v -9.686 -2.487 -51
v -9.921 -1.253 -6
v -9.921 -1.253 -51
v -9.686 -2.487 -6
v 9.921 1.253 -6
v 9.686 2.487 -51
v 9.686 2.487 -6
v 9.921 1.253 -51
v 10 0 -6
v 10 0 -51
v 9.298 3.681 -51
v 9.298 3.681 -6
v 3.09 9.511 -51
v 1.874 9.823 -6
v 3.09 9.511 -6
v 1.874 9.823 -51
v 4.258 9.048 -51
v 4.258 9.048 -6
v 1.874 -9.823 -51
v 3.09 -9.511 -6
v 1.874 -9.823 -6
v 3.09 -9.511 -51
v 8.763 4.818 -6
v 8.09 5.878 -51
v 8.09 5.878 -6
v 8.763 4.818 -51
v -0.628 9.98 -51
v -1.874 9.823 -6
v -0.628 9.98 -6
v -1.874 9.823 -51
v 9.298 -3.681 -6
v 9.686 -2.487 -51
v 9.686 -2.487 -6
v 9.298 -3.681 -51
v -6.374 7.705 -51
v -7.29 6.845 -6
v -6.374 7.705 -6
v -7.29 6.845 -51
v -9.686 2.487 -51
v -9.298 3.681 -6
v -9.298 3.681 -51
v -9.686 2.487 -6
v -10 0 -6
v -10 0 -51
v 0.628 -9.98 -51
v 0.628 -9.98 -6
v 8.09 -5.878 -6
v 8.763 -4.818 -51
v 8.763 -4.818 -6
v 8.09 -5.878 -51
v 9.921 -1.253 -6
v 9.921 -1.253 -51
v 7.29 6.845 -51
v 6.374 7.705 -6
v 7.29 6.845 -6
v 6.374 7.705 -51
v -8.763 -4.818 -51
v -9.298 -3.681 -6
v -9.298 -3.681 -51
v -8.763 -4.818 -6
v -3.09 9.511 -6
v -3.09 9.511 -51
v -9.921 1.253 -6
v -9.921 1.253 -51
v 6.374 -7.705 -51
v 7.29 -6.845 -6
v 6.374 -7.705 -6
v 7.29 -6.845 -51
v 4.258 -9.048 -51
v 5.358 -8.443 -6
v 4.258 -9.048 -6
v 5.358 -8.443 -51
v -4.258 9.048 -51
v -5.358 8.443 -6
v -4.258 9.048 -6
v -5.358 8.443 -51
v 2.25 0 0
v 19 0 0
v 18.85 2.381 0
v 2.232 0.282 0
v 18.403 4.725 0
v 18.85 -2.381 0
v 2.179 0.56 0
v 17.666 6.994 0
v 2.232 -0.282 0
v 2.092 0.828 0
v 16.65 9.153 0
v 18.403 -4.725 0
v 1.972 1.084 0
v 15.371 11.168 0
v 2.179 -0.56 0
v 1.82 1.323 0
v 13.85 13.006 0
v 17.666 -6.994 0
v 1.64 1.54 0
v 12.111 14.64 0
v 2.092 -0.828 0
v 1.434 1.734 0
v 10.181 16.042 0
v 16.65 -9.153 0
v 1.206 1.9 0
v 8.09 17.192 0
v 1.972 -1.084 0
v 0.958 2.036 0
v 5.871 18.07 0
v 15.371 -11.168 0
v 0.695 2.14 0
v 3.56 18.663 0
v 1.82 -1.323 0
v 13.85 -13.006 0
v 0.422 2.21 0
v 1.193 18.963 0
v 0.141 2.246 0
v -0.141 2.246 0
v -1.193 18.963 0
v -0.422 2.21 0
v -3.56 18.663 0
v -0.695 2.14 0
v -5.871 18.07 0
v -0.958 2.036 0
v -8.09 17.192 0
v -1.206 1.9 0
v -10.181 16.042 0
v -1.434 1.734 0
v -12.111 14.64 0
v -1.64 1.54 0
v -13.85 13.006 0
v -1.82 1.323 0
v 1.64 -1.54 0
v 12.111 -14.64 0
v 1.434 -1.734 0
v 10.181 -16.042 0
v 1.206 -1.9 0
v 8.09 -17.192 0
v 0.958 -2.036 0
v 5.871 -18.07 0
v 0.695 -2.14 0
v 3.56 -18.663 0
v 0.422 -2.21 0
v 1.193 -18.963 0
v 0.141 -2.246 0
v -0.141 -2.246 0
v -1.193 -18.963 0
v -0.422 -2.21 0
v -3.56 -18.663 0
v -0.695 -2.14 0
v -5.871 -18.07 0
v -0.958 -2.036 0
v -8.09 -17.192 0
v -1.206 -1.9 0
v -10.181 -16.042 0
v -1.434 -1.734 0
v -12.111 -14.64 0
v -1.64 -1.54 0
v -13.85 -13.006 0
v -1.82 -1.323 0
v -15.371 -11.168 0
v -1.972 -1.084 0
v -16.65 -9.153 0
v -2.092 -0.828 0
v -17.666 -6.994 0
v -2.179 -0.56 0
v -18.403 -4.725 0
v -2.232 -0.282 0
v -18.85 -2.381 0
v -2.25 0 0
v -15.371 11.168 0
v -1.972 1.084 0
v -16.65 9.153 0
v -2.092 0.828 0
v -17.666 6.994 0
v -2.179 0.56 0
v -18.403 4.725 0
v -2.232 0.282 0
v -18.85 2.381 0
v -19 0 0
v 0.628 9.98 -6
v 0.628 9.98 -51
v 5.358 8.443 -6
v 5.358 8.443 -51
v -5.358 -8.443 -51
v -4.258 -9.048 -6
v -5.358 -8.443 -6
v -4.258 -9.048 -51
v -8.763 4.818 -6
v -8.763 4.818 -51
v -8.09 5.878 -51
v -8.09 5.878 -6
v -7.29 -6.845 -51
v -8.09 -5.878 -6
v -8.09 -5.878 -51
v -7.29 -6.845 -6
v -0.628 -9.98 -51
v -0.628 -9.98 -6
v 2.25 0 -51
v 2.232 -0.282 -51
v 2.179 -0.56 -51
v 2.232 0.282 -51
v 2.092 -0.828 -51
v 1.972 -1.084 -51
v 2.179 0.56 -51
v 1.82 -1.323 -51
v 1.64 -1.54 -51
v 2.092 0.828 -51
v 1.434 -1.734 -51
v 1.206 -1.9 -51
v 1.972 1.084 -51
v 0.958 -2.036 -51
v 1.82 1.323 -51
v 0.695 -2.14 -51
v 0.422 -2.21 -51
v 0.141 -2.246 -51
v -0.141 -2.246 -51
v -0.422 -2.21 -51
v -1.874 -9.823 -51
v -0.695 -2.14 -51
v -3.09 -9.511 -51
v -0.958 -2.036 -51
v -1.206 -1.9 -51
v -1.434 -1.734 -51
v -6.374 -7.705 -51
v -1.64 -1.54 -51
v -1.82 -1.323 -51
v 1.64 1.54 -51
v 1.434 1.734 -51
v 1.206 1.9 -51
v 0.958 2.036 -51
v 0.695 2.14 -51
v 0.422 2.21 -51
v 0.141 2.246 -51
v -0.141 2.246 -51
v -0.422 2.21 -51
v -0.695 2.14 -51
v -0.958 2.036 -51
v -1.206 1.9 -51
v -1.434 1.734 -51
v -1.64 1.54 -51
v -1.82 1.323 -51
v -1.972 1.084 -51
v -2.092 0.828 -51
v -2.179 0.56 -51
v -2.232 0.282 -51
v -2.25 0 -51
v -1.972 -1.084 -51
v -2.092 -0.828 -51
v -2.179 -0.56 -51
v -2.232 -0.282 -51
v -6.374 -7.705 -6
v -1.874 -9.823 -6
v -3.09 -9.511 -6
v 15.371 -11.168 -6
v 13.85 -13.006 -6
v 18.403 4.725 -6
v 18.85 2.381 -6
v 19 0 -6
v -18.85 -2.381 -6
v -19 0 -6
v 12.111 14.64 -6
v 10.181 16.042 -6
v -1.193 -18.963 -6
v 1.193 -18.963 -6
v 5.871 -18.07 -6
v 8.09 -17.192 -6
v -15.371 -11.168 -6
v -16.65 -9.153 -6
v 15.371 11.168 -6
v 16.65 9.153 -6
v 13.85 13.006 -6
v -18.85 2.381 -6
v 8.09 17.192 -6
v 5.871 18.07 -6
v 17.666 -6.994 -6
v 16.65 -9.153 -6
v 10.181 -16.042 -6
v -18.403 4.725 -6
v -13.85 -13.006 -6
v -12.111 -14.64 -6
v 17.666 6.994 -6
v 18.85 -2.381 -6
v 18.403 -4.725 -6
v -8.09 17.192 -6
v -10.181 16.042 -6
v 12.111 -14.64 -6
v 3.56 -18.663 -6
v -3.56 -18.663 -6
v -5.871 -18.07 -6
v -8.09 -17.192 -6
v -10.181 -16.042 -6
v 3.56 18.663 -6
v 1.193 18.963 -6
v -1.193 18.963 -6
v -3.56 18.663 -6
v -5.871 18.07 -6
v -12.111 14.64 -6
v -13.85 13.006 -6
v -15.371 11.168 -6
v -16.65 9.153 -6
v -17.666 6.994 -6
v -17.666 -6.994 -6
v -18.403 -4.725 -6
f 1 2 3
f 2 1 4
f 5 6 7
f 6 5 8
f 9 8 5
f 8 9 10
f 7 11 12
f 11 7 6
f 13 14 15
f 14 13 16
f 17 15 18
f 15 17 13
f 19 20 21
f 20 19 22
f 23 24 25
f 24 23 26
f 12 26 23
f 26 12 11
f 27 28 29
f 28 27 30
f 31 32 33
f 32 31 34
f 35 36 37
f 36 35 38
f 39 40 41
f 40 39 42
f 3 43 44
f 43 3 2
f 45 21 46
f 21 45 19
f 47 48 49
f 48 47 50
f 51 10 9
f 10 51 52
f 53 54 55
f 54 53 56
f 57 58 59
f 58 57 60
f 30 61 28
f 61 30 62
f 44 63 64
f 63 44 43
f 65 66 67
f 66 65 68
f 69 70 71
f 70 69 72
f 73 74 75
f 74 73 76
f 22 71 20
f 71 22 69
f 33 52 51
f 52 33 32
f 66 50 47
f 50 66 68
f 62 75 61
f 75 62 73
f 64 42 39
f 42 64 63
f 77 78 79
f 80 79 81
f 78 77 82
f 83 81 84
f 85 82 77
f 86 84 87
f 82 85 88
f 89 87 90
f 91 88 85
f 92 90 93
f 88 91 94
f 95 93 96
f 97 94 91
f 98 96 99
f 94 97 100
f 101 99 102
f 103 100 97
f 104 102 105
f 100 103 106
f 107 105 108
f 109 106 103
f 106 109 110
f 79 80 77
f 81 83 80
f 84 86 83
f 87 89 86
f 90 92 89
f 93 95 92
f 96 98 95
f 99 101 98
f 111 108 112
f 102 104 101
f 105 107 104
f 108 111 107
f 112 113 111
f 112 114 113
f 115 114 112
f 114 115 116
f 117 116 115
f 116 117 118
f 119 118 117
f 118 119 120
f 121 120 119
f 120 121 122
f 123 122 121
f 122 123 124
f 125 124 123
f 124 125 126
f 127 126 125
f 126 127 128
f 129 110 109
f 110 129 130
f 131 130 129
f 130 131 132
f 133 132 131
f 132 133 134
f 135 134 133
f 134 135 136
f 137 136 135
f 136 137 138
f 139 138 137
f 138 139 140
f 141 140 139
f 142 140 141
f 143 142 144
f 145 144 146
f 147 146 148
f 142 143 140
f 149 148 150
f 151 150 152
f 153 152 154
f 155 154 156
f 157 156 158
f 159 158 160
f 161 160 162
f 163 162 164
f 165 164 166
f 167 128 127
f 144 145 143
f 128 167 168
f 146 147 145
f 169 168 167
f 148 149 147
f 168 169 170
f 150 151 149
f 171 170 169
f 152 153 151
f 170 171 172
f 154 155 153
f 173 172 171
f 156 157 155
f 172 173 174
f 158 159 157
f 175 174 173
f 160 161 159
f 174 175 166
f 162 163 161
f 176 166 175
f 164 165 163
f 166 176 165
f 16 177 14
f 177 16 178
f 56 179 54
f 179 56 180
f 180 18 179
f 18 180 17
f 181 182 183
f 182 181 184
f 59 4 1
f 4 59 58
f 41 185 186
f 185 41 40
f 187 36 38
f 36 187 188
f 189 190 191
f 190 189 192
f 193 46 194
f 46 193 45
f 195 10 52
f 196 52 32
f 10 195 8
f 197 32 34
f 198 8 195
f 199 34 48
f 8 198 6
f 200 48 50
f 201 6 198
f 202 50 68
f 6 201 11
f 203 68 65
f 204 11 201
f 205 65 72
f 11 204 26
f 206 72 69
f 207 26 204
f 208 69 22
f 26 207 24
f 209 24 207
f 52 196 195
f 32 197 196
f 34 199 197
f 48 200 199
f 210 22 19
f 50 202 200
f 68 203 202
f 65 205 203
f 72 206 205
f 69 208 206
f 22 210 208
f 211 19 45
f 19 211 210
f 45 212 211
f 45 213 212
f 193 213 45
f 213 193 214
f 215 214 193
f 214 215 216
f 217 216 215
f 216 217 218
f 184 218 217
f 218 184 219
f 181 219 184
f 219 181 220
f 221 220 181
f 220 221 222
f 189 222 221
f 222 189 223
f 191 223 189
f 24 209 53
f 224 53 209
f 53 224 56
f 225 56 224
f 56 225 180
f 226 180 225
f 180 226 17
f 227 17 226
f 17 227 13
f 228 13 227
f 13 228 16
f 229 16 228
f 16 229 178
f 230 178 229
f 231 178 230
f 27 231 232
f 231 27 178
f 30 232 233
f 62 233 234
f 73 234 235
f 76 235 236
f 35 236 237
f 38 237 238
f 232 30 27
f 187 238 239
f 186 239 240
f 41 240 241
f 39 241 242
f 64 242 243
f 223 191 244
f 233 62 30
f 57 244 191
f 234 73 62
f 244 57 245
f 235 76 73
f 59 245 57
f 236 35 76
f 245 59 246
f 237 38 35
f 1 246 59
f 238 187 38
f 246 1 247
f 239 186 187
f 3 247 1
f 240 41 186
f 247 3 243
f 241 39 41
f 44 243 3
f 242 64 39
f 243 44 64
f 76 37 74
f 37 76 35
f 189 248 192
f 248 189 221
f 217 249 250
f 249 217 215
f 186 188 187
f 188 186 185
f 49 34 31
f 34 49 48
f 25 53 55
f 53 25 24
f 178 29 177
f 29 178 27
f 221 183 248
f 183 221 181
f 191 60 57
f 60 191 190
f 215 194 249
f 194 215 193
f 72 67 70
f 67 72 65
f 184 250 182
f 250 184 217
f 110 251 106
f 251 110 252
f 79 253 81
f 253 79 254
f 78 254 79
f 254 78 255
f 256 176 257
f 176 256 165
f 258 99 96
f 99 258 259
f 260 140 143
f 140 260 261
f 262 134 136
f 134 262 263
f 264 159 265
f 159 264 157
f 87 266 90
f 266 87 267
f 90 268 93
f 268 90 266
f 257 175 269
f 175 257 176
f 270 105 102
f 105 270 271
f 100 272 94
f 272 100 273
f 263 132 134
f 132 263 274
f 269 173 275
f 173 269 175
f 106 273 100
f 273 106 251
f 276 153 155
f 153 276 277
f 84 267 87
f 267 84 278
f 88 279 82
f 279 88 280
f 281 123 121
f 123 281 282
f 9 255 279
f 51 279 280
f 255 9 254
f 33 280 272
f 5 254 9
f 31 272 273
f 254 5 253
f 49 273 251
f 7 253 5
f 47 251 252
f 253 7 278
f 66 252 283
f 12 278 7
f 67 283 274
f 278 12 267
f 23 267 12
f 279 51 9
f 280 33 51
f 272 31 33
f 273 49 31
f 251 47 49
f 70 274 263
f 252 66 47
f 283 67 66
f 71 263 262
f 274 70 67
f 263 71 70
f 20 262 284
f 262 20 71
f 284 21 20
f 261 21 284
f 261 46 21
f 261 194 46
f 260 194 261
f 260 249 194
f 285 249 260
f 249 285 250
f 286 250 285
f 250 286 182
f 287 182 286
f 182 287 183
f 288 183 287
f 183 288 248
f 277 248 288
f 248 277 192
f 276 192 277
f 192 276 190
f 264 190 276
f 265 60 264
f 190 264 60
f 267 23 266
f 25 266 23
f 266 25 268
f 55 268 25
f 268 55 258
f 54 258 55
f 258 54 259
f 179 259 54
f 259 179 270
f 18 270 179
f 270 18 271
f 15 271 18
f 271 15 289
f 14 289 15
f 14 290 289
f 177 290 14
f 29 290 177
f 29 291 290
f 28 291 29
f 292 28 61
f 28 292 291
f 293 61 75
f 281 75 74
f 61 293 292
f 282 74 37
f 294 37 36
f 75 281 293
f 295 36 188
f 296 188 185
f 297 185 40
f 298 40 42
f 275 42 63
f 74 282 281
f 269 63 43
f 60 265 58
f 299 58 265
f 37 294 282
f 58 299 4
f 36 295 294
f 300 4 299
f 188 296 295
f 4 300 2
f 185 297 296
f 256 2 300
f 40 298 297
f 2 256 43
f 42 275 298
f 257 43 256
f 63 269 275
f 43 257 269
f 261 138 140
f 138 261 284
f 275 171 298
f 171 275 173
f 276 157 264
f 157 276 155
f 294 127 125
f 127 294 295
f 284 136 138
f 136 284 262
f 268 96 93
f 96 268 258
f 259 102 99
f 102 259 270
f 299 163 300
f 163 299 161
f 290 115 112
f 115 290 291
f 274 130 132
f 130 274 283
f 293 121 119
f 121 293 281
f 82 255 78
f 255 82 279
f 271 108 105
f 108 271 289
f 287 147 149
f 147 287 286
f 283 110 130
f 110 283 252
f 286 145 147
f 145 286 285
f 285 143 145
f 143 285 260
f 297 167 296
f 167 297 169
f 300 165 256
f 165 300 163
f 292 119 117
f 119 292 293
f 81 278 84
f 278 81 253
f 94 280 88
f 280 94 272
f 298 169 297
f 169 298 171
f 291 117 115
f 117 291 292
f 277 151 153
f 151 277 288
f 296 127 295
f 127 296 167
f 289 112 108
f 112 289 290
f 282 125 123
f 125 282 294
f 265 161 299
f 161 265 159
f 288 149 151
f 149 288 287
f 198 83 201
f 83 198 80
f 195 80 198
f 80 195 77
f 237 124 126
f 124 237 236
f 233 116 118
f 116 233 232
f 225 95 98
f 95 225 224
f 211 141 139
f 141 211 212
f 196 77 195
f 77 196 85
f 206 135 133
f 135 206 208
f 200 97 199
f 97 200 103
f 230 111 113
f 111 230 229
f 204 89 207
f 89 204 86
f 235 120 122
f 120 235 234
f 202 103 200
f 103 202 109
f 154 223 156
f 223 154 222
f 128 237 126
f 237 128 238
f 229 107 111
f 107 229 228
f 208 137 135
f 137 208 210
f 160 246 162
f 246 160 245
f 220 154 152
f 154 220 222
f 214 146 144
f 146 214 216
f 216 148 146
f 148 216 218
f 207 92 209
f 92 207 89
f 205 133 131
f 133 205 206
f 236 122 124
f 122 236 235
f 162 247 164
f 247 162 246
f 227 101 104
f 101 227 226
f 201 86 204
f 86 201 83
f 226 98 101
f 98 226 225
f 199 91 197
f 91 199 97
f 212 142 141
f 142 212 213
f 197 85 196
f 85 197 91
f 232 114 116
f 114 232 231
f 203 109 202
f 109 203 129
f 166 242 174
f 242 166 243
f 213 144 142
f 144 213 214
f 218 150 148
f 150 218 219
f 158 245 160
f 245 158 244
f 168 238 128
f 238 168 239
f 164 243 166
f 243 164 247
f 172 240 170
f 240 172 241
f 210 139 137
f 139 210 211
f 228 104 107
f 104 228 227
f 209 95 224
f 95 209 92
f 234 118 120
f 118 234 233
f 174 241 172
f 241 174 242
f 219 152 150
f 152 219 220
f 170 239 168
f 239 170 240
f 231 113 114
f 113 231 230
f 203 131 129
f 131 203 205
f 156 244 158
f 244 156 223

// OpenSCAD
$fn = 50;


difference() {
	union() {
		translate(v = [0, 0, -51.0000000000]) {
			cylinder(h = 51, r = 10.0000000000);
		}
		translate(v = [0, 0, -6.0000000000]) {
			cylinder(h = 6, r = 19.0000000000);
		}
	}
	union() {
		#translate(v = [0, 0, -51]) {
			cylinder(h = 51, r = 2.2500000000);
		}
	}
}
